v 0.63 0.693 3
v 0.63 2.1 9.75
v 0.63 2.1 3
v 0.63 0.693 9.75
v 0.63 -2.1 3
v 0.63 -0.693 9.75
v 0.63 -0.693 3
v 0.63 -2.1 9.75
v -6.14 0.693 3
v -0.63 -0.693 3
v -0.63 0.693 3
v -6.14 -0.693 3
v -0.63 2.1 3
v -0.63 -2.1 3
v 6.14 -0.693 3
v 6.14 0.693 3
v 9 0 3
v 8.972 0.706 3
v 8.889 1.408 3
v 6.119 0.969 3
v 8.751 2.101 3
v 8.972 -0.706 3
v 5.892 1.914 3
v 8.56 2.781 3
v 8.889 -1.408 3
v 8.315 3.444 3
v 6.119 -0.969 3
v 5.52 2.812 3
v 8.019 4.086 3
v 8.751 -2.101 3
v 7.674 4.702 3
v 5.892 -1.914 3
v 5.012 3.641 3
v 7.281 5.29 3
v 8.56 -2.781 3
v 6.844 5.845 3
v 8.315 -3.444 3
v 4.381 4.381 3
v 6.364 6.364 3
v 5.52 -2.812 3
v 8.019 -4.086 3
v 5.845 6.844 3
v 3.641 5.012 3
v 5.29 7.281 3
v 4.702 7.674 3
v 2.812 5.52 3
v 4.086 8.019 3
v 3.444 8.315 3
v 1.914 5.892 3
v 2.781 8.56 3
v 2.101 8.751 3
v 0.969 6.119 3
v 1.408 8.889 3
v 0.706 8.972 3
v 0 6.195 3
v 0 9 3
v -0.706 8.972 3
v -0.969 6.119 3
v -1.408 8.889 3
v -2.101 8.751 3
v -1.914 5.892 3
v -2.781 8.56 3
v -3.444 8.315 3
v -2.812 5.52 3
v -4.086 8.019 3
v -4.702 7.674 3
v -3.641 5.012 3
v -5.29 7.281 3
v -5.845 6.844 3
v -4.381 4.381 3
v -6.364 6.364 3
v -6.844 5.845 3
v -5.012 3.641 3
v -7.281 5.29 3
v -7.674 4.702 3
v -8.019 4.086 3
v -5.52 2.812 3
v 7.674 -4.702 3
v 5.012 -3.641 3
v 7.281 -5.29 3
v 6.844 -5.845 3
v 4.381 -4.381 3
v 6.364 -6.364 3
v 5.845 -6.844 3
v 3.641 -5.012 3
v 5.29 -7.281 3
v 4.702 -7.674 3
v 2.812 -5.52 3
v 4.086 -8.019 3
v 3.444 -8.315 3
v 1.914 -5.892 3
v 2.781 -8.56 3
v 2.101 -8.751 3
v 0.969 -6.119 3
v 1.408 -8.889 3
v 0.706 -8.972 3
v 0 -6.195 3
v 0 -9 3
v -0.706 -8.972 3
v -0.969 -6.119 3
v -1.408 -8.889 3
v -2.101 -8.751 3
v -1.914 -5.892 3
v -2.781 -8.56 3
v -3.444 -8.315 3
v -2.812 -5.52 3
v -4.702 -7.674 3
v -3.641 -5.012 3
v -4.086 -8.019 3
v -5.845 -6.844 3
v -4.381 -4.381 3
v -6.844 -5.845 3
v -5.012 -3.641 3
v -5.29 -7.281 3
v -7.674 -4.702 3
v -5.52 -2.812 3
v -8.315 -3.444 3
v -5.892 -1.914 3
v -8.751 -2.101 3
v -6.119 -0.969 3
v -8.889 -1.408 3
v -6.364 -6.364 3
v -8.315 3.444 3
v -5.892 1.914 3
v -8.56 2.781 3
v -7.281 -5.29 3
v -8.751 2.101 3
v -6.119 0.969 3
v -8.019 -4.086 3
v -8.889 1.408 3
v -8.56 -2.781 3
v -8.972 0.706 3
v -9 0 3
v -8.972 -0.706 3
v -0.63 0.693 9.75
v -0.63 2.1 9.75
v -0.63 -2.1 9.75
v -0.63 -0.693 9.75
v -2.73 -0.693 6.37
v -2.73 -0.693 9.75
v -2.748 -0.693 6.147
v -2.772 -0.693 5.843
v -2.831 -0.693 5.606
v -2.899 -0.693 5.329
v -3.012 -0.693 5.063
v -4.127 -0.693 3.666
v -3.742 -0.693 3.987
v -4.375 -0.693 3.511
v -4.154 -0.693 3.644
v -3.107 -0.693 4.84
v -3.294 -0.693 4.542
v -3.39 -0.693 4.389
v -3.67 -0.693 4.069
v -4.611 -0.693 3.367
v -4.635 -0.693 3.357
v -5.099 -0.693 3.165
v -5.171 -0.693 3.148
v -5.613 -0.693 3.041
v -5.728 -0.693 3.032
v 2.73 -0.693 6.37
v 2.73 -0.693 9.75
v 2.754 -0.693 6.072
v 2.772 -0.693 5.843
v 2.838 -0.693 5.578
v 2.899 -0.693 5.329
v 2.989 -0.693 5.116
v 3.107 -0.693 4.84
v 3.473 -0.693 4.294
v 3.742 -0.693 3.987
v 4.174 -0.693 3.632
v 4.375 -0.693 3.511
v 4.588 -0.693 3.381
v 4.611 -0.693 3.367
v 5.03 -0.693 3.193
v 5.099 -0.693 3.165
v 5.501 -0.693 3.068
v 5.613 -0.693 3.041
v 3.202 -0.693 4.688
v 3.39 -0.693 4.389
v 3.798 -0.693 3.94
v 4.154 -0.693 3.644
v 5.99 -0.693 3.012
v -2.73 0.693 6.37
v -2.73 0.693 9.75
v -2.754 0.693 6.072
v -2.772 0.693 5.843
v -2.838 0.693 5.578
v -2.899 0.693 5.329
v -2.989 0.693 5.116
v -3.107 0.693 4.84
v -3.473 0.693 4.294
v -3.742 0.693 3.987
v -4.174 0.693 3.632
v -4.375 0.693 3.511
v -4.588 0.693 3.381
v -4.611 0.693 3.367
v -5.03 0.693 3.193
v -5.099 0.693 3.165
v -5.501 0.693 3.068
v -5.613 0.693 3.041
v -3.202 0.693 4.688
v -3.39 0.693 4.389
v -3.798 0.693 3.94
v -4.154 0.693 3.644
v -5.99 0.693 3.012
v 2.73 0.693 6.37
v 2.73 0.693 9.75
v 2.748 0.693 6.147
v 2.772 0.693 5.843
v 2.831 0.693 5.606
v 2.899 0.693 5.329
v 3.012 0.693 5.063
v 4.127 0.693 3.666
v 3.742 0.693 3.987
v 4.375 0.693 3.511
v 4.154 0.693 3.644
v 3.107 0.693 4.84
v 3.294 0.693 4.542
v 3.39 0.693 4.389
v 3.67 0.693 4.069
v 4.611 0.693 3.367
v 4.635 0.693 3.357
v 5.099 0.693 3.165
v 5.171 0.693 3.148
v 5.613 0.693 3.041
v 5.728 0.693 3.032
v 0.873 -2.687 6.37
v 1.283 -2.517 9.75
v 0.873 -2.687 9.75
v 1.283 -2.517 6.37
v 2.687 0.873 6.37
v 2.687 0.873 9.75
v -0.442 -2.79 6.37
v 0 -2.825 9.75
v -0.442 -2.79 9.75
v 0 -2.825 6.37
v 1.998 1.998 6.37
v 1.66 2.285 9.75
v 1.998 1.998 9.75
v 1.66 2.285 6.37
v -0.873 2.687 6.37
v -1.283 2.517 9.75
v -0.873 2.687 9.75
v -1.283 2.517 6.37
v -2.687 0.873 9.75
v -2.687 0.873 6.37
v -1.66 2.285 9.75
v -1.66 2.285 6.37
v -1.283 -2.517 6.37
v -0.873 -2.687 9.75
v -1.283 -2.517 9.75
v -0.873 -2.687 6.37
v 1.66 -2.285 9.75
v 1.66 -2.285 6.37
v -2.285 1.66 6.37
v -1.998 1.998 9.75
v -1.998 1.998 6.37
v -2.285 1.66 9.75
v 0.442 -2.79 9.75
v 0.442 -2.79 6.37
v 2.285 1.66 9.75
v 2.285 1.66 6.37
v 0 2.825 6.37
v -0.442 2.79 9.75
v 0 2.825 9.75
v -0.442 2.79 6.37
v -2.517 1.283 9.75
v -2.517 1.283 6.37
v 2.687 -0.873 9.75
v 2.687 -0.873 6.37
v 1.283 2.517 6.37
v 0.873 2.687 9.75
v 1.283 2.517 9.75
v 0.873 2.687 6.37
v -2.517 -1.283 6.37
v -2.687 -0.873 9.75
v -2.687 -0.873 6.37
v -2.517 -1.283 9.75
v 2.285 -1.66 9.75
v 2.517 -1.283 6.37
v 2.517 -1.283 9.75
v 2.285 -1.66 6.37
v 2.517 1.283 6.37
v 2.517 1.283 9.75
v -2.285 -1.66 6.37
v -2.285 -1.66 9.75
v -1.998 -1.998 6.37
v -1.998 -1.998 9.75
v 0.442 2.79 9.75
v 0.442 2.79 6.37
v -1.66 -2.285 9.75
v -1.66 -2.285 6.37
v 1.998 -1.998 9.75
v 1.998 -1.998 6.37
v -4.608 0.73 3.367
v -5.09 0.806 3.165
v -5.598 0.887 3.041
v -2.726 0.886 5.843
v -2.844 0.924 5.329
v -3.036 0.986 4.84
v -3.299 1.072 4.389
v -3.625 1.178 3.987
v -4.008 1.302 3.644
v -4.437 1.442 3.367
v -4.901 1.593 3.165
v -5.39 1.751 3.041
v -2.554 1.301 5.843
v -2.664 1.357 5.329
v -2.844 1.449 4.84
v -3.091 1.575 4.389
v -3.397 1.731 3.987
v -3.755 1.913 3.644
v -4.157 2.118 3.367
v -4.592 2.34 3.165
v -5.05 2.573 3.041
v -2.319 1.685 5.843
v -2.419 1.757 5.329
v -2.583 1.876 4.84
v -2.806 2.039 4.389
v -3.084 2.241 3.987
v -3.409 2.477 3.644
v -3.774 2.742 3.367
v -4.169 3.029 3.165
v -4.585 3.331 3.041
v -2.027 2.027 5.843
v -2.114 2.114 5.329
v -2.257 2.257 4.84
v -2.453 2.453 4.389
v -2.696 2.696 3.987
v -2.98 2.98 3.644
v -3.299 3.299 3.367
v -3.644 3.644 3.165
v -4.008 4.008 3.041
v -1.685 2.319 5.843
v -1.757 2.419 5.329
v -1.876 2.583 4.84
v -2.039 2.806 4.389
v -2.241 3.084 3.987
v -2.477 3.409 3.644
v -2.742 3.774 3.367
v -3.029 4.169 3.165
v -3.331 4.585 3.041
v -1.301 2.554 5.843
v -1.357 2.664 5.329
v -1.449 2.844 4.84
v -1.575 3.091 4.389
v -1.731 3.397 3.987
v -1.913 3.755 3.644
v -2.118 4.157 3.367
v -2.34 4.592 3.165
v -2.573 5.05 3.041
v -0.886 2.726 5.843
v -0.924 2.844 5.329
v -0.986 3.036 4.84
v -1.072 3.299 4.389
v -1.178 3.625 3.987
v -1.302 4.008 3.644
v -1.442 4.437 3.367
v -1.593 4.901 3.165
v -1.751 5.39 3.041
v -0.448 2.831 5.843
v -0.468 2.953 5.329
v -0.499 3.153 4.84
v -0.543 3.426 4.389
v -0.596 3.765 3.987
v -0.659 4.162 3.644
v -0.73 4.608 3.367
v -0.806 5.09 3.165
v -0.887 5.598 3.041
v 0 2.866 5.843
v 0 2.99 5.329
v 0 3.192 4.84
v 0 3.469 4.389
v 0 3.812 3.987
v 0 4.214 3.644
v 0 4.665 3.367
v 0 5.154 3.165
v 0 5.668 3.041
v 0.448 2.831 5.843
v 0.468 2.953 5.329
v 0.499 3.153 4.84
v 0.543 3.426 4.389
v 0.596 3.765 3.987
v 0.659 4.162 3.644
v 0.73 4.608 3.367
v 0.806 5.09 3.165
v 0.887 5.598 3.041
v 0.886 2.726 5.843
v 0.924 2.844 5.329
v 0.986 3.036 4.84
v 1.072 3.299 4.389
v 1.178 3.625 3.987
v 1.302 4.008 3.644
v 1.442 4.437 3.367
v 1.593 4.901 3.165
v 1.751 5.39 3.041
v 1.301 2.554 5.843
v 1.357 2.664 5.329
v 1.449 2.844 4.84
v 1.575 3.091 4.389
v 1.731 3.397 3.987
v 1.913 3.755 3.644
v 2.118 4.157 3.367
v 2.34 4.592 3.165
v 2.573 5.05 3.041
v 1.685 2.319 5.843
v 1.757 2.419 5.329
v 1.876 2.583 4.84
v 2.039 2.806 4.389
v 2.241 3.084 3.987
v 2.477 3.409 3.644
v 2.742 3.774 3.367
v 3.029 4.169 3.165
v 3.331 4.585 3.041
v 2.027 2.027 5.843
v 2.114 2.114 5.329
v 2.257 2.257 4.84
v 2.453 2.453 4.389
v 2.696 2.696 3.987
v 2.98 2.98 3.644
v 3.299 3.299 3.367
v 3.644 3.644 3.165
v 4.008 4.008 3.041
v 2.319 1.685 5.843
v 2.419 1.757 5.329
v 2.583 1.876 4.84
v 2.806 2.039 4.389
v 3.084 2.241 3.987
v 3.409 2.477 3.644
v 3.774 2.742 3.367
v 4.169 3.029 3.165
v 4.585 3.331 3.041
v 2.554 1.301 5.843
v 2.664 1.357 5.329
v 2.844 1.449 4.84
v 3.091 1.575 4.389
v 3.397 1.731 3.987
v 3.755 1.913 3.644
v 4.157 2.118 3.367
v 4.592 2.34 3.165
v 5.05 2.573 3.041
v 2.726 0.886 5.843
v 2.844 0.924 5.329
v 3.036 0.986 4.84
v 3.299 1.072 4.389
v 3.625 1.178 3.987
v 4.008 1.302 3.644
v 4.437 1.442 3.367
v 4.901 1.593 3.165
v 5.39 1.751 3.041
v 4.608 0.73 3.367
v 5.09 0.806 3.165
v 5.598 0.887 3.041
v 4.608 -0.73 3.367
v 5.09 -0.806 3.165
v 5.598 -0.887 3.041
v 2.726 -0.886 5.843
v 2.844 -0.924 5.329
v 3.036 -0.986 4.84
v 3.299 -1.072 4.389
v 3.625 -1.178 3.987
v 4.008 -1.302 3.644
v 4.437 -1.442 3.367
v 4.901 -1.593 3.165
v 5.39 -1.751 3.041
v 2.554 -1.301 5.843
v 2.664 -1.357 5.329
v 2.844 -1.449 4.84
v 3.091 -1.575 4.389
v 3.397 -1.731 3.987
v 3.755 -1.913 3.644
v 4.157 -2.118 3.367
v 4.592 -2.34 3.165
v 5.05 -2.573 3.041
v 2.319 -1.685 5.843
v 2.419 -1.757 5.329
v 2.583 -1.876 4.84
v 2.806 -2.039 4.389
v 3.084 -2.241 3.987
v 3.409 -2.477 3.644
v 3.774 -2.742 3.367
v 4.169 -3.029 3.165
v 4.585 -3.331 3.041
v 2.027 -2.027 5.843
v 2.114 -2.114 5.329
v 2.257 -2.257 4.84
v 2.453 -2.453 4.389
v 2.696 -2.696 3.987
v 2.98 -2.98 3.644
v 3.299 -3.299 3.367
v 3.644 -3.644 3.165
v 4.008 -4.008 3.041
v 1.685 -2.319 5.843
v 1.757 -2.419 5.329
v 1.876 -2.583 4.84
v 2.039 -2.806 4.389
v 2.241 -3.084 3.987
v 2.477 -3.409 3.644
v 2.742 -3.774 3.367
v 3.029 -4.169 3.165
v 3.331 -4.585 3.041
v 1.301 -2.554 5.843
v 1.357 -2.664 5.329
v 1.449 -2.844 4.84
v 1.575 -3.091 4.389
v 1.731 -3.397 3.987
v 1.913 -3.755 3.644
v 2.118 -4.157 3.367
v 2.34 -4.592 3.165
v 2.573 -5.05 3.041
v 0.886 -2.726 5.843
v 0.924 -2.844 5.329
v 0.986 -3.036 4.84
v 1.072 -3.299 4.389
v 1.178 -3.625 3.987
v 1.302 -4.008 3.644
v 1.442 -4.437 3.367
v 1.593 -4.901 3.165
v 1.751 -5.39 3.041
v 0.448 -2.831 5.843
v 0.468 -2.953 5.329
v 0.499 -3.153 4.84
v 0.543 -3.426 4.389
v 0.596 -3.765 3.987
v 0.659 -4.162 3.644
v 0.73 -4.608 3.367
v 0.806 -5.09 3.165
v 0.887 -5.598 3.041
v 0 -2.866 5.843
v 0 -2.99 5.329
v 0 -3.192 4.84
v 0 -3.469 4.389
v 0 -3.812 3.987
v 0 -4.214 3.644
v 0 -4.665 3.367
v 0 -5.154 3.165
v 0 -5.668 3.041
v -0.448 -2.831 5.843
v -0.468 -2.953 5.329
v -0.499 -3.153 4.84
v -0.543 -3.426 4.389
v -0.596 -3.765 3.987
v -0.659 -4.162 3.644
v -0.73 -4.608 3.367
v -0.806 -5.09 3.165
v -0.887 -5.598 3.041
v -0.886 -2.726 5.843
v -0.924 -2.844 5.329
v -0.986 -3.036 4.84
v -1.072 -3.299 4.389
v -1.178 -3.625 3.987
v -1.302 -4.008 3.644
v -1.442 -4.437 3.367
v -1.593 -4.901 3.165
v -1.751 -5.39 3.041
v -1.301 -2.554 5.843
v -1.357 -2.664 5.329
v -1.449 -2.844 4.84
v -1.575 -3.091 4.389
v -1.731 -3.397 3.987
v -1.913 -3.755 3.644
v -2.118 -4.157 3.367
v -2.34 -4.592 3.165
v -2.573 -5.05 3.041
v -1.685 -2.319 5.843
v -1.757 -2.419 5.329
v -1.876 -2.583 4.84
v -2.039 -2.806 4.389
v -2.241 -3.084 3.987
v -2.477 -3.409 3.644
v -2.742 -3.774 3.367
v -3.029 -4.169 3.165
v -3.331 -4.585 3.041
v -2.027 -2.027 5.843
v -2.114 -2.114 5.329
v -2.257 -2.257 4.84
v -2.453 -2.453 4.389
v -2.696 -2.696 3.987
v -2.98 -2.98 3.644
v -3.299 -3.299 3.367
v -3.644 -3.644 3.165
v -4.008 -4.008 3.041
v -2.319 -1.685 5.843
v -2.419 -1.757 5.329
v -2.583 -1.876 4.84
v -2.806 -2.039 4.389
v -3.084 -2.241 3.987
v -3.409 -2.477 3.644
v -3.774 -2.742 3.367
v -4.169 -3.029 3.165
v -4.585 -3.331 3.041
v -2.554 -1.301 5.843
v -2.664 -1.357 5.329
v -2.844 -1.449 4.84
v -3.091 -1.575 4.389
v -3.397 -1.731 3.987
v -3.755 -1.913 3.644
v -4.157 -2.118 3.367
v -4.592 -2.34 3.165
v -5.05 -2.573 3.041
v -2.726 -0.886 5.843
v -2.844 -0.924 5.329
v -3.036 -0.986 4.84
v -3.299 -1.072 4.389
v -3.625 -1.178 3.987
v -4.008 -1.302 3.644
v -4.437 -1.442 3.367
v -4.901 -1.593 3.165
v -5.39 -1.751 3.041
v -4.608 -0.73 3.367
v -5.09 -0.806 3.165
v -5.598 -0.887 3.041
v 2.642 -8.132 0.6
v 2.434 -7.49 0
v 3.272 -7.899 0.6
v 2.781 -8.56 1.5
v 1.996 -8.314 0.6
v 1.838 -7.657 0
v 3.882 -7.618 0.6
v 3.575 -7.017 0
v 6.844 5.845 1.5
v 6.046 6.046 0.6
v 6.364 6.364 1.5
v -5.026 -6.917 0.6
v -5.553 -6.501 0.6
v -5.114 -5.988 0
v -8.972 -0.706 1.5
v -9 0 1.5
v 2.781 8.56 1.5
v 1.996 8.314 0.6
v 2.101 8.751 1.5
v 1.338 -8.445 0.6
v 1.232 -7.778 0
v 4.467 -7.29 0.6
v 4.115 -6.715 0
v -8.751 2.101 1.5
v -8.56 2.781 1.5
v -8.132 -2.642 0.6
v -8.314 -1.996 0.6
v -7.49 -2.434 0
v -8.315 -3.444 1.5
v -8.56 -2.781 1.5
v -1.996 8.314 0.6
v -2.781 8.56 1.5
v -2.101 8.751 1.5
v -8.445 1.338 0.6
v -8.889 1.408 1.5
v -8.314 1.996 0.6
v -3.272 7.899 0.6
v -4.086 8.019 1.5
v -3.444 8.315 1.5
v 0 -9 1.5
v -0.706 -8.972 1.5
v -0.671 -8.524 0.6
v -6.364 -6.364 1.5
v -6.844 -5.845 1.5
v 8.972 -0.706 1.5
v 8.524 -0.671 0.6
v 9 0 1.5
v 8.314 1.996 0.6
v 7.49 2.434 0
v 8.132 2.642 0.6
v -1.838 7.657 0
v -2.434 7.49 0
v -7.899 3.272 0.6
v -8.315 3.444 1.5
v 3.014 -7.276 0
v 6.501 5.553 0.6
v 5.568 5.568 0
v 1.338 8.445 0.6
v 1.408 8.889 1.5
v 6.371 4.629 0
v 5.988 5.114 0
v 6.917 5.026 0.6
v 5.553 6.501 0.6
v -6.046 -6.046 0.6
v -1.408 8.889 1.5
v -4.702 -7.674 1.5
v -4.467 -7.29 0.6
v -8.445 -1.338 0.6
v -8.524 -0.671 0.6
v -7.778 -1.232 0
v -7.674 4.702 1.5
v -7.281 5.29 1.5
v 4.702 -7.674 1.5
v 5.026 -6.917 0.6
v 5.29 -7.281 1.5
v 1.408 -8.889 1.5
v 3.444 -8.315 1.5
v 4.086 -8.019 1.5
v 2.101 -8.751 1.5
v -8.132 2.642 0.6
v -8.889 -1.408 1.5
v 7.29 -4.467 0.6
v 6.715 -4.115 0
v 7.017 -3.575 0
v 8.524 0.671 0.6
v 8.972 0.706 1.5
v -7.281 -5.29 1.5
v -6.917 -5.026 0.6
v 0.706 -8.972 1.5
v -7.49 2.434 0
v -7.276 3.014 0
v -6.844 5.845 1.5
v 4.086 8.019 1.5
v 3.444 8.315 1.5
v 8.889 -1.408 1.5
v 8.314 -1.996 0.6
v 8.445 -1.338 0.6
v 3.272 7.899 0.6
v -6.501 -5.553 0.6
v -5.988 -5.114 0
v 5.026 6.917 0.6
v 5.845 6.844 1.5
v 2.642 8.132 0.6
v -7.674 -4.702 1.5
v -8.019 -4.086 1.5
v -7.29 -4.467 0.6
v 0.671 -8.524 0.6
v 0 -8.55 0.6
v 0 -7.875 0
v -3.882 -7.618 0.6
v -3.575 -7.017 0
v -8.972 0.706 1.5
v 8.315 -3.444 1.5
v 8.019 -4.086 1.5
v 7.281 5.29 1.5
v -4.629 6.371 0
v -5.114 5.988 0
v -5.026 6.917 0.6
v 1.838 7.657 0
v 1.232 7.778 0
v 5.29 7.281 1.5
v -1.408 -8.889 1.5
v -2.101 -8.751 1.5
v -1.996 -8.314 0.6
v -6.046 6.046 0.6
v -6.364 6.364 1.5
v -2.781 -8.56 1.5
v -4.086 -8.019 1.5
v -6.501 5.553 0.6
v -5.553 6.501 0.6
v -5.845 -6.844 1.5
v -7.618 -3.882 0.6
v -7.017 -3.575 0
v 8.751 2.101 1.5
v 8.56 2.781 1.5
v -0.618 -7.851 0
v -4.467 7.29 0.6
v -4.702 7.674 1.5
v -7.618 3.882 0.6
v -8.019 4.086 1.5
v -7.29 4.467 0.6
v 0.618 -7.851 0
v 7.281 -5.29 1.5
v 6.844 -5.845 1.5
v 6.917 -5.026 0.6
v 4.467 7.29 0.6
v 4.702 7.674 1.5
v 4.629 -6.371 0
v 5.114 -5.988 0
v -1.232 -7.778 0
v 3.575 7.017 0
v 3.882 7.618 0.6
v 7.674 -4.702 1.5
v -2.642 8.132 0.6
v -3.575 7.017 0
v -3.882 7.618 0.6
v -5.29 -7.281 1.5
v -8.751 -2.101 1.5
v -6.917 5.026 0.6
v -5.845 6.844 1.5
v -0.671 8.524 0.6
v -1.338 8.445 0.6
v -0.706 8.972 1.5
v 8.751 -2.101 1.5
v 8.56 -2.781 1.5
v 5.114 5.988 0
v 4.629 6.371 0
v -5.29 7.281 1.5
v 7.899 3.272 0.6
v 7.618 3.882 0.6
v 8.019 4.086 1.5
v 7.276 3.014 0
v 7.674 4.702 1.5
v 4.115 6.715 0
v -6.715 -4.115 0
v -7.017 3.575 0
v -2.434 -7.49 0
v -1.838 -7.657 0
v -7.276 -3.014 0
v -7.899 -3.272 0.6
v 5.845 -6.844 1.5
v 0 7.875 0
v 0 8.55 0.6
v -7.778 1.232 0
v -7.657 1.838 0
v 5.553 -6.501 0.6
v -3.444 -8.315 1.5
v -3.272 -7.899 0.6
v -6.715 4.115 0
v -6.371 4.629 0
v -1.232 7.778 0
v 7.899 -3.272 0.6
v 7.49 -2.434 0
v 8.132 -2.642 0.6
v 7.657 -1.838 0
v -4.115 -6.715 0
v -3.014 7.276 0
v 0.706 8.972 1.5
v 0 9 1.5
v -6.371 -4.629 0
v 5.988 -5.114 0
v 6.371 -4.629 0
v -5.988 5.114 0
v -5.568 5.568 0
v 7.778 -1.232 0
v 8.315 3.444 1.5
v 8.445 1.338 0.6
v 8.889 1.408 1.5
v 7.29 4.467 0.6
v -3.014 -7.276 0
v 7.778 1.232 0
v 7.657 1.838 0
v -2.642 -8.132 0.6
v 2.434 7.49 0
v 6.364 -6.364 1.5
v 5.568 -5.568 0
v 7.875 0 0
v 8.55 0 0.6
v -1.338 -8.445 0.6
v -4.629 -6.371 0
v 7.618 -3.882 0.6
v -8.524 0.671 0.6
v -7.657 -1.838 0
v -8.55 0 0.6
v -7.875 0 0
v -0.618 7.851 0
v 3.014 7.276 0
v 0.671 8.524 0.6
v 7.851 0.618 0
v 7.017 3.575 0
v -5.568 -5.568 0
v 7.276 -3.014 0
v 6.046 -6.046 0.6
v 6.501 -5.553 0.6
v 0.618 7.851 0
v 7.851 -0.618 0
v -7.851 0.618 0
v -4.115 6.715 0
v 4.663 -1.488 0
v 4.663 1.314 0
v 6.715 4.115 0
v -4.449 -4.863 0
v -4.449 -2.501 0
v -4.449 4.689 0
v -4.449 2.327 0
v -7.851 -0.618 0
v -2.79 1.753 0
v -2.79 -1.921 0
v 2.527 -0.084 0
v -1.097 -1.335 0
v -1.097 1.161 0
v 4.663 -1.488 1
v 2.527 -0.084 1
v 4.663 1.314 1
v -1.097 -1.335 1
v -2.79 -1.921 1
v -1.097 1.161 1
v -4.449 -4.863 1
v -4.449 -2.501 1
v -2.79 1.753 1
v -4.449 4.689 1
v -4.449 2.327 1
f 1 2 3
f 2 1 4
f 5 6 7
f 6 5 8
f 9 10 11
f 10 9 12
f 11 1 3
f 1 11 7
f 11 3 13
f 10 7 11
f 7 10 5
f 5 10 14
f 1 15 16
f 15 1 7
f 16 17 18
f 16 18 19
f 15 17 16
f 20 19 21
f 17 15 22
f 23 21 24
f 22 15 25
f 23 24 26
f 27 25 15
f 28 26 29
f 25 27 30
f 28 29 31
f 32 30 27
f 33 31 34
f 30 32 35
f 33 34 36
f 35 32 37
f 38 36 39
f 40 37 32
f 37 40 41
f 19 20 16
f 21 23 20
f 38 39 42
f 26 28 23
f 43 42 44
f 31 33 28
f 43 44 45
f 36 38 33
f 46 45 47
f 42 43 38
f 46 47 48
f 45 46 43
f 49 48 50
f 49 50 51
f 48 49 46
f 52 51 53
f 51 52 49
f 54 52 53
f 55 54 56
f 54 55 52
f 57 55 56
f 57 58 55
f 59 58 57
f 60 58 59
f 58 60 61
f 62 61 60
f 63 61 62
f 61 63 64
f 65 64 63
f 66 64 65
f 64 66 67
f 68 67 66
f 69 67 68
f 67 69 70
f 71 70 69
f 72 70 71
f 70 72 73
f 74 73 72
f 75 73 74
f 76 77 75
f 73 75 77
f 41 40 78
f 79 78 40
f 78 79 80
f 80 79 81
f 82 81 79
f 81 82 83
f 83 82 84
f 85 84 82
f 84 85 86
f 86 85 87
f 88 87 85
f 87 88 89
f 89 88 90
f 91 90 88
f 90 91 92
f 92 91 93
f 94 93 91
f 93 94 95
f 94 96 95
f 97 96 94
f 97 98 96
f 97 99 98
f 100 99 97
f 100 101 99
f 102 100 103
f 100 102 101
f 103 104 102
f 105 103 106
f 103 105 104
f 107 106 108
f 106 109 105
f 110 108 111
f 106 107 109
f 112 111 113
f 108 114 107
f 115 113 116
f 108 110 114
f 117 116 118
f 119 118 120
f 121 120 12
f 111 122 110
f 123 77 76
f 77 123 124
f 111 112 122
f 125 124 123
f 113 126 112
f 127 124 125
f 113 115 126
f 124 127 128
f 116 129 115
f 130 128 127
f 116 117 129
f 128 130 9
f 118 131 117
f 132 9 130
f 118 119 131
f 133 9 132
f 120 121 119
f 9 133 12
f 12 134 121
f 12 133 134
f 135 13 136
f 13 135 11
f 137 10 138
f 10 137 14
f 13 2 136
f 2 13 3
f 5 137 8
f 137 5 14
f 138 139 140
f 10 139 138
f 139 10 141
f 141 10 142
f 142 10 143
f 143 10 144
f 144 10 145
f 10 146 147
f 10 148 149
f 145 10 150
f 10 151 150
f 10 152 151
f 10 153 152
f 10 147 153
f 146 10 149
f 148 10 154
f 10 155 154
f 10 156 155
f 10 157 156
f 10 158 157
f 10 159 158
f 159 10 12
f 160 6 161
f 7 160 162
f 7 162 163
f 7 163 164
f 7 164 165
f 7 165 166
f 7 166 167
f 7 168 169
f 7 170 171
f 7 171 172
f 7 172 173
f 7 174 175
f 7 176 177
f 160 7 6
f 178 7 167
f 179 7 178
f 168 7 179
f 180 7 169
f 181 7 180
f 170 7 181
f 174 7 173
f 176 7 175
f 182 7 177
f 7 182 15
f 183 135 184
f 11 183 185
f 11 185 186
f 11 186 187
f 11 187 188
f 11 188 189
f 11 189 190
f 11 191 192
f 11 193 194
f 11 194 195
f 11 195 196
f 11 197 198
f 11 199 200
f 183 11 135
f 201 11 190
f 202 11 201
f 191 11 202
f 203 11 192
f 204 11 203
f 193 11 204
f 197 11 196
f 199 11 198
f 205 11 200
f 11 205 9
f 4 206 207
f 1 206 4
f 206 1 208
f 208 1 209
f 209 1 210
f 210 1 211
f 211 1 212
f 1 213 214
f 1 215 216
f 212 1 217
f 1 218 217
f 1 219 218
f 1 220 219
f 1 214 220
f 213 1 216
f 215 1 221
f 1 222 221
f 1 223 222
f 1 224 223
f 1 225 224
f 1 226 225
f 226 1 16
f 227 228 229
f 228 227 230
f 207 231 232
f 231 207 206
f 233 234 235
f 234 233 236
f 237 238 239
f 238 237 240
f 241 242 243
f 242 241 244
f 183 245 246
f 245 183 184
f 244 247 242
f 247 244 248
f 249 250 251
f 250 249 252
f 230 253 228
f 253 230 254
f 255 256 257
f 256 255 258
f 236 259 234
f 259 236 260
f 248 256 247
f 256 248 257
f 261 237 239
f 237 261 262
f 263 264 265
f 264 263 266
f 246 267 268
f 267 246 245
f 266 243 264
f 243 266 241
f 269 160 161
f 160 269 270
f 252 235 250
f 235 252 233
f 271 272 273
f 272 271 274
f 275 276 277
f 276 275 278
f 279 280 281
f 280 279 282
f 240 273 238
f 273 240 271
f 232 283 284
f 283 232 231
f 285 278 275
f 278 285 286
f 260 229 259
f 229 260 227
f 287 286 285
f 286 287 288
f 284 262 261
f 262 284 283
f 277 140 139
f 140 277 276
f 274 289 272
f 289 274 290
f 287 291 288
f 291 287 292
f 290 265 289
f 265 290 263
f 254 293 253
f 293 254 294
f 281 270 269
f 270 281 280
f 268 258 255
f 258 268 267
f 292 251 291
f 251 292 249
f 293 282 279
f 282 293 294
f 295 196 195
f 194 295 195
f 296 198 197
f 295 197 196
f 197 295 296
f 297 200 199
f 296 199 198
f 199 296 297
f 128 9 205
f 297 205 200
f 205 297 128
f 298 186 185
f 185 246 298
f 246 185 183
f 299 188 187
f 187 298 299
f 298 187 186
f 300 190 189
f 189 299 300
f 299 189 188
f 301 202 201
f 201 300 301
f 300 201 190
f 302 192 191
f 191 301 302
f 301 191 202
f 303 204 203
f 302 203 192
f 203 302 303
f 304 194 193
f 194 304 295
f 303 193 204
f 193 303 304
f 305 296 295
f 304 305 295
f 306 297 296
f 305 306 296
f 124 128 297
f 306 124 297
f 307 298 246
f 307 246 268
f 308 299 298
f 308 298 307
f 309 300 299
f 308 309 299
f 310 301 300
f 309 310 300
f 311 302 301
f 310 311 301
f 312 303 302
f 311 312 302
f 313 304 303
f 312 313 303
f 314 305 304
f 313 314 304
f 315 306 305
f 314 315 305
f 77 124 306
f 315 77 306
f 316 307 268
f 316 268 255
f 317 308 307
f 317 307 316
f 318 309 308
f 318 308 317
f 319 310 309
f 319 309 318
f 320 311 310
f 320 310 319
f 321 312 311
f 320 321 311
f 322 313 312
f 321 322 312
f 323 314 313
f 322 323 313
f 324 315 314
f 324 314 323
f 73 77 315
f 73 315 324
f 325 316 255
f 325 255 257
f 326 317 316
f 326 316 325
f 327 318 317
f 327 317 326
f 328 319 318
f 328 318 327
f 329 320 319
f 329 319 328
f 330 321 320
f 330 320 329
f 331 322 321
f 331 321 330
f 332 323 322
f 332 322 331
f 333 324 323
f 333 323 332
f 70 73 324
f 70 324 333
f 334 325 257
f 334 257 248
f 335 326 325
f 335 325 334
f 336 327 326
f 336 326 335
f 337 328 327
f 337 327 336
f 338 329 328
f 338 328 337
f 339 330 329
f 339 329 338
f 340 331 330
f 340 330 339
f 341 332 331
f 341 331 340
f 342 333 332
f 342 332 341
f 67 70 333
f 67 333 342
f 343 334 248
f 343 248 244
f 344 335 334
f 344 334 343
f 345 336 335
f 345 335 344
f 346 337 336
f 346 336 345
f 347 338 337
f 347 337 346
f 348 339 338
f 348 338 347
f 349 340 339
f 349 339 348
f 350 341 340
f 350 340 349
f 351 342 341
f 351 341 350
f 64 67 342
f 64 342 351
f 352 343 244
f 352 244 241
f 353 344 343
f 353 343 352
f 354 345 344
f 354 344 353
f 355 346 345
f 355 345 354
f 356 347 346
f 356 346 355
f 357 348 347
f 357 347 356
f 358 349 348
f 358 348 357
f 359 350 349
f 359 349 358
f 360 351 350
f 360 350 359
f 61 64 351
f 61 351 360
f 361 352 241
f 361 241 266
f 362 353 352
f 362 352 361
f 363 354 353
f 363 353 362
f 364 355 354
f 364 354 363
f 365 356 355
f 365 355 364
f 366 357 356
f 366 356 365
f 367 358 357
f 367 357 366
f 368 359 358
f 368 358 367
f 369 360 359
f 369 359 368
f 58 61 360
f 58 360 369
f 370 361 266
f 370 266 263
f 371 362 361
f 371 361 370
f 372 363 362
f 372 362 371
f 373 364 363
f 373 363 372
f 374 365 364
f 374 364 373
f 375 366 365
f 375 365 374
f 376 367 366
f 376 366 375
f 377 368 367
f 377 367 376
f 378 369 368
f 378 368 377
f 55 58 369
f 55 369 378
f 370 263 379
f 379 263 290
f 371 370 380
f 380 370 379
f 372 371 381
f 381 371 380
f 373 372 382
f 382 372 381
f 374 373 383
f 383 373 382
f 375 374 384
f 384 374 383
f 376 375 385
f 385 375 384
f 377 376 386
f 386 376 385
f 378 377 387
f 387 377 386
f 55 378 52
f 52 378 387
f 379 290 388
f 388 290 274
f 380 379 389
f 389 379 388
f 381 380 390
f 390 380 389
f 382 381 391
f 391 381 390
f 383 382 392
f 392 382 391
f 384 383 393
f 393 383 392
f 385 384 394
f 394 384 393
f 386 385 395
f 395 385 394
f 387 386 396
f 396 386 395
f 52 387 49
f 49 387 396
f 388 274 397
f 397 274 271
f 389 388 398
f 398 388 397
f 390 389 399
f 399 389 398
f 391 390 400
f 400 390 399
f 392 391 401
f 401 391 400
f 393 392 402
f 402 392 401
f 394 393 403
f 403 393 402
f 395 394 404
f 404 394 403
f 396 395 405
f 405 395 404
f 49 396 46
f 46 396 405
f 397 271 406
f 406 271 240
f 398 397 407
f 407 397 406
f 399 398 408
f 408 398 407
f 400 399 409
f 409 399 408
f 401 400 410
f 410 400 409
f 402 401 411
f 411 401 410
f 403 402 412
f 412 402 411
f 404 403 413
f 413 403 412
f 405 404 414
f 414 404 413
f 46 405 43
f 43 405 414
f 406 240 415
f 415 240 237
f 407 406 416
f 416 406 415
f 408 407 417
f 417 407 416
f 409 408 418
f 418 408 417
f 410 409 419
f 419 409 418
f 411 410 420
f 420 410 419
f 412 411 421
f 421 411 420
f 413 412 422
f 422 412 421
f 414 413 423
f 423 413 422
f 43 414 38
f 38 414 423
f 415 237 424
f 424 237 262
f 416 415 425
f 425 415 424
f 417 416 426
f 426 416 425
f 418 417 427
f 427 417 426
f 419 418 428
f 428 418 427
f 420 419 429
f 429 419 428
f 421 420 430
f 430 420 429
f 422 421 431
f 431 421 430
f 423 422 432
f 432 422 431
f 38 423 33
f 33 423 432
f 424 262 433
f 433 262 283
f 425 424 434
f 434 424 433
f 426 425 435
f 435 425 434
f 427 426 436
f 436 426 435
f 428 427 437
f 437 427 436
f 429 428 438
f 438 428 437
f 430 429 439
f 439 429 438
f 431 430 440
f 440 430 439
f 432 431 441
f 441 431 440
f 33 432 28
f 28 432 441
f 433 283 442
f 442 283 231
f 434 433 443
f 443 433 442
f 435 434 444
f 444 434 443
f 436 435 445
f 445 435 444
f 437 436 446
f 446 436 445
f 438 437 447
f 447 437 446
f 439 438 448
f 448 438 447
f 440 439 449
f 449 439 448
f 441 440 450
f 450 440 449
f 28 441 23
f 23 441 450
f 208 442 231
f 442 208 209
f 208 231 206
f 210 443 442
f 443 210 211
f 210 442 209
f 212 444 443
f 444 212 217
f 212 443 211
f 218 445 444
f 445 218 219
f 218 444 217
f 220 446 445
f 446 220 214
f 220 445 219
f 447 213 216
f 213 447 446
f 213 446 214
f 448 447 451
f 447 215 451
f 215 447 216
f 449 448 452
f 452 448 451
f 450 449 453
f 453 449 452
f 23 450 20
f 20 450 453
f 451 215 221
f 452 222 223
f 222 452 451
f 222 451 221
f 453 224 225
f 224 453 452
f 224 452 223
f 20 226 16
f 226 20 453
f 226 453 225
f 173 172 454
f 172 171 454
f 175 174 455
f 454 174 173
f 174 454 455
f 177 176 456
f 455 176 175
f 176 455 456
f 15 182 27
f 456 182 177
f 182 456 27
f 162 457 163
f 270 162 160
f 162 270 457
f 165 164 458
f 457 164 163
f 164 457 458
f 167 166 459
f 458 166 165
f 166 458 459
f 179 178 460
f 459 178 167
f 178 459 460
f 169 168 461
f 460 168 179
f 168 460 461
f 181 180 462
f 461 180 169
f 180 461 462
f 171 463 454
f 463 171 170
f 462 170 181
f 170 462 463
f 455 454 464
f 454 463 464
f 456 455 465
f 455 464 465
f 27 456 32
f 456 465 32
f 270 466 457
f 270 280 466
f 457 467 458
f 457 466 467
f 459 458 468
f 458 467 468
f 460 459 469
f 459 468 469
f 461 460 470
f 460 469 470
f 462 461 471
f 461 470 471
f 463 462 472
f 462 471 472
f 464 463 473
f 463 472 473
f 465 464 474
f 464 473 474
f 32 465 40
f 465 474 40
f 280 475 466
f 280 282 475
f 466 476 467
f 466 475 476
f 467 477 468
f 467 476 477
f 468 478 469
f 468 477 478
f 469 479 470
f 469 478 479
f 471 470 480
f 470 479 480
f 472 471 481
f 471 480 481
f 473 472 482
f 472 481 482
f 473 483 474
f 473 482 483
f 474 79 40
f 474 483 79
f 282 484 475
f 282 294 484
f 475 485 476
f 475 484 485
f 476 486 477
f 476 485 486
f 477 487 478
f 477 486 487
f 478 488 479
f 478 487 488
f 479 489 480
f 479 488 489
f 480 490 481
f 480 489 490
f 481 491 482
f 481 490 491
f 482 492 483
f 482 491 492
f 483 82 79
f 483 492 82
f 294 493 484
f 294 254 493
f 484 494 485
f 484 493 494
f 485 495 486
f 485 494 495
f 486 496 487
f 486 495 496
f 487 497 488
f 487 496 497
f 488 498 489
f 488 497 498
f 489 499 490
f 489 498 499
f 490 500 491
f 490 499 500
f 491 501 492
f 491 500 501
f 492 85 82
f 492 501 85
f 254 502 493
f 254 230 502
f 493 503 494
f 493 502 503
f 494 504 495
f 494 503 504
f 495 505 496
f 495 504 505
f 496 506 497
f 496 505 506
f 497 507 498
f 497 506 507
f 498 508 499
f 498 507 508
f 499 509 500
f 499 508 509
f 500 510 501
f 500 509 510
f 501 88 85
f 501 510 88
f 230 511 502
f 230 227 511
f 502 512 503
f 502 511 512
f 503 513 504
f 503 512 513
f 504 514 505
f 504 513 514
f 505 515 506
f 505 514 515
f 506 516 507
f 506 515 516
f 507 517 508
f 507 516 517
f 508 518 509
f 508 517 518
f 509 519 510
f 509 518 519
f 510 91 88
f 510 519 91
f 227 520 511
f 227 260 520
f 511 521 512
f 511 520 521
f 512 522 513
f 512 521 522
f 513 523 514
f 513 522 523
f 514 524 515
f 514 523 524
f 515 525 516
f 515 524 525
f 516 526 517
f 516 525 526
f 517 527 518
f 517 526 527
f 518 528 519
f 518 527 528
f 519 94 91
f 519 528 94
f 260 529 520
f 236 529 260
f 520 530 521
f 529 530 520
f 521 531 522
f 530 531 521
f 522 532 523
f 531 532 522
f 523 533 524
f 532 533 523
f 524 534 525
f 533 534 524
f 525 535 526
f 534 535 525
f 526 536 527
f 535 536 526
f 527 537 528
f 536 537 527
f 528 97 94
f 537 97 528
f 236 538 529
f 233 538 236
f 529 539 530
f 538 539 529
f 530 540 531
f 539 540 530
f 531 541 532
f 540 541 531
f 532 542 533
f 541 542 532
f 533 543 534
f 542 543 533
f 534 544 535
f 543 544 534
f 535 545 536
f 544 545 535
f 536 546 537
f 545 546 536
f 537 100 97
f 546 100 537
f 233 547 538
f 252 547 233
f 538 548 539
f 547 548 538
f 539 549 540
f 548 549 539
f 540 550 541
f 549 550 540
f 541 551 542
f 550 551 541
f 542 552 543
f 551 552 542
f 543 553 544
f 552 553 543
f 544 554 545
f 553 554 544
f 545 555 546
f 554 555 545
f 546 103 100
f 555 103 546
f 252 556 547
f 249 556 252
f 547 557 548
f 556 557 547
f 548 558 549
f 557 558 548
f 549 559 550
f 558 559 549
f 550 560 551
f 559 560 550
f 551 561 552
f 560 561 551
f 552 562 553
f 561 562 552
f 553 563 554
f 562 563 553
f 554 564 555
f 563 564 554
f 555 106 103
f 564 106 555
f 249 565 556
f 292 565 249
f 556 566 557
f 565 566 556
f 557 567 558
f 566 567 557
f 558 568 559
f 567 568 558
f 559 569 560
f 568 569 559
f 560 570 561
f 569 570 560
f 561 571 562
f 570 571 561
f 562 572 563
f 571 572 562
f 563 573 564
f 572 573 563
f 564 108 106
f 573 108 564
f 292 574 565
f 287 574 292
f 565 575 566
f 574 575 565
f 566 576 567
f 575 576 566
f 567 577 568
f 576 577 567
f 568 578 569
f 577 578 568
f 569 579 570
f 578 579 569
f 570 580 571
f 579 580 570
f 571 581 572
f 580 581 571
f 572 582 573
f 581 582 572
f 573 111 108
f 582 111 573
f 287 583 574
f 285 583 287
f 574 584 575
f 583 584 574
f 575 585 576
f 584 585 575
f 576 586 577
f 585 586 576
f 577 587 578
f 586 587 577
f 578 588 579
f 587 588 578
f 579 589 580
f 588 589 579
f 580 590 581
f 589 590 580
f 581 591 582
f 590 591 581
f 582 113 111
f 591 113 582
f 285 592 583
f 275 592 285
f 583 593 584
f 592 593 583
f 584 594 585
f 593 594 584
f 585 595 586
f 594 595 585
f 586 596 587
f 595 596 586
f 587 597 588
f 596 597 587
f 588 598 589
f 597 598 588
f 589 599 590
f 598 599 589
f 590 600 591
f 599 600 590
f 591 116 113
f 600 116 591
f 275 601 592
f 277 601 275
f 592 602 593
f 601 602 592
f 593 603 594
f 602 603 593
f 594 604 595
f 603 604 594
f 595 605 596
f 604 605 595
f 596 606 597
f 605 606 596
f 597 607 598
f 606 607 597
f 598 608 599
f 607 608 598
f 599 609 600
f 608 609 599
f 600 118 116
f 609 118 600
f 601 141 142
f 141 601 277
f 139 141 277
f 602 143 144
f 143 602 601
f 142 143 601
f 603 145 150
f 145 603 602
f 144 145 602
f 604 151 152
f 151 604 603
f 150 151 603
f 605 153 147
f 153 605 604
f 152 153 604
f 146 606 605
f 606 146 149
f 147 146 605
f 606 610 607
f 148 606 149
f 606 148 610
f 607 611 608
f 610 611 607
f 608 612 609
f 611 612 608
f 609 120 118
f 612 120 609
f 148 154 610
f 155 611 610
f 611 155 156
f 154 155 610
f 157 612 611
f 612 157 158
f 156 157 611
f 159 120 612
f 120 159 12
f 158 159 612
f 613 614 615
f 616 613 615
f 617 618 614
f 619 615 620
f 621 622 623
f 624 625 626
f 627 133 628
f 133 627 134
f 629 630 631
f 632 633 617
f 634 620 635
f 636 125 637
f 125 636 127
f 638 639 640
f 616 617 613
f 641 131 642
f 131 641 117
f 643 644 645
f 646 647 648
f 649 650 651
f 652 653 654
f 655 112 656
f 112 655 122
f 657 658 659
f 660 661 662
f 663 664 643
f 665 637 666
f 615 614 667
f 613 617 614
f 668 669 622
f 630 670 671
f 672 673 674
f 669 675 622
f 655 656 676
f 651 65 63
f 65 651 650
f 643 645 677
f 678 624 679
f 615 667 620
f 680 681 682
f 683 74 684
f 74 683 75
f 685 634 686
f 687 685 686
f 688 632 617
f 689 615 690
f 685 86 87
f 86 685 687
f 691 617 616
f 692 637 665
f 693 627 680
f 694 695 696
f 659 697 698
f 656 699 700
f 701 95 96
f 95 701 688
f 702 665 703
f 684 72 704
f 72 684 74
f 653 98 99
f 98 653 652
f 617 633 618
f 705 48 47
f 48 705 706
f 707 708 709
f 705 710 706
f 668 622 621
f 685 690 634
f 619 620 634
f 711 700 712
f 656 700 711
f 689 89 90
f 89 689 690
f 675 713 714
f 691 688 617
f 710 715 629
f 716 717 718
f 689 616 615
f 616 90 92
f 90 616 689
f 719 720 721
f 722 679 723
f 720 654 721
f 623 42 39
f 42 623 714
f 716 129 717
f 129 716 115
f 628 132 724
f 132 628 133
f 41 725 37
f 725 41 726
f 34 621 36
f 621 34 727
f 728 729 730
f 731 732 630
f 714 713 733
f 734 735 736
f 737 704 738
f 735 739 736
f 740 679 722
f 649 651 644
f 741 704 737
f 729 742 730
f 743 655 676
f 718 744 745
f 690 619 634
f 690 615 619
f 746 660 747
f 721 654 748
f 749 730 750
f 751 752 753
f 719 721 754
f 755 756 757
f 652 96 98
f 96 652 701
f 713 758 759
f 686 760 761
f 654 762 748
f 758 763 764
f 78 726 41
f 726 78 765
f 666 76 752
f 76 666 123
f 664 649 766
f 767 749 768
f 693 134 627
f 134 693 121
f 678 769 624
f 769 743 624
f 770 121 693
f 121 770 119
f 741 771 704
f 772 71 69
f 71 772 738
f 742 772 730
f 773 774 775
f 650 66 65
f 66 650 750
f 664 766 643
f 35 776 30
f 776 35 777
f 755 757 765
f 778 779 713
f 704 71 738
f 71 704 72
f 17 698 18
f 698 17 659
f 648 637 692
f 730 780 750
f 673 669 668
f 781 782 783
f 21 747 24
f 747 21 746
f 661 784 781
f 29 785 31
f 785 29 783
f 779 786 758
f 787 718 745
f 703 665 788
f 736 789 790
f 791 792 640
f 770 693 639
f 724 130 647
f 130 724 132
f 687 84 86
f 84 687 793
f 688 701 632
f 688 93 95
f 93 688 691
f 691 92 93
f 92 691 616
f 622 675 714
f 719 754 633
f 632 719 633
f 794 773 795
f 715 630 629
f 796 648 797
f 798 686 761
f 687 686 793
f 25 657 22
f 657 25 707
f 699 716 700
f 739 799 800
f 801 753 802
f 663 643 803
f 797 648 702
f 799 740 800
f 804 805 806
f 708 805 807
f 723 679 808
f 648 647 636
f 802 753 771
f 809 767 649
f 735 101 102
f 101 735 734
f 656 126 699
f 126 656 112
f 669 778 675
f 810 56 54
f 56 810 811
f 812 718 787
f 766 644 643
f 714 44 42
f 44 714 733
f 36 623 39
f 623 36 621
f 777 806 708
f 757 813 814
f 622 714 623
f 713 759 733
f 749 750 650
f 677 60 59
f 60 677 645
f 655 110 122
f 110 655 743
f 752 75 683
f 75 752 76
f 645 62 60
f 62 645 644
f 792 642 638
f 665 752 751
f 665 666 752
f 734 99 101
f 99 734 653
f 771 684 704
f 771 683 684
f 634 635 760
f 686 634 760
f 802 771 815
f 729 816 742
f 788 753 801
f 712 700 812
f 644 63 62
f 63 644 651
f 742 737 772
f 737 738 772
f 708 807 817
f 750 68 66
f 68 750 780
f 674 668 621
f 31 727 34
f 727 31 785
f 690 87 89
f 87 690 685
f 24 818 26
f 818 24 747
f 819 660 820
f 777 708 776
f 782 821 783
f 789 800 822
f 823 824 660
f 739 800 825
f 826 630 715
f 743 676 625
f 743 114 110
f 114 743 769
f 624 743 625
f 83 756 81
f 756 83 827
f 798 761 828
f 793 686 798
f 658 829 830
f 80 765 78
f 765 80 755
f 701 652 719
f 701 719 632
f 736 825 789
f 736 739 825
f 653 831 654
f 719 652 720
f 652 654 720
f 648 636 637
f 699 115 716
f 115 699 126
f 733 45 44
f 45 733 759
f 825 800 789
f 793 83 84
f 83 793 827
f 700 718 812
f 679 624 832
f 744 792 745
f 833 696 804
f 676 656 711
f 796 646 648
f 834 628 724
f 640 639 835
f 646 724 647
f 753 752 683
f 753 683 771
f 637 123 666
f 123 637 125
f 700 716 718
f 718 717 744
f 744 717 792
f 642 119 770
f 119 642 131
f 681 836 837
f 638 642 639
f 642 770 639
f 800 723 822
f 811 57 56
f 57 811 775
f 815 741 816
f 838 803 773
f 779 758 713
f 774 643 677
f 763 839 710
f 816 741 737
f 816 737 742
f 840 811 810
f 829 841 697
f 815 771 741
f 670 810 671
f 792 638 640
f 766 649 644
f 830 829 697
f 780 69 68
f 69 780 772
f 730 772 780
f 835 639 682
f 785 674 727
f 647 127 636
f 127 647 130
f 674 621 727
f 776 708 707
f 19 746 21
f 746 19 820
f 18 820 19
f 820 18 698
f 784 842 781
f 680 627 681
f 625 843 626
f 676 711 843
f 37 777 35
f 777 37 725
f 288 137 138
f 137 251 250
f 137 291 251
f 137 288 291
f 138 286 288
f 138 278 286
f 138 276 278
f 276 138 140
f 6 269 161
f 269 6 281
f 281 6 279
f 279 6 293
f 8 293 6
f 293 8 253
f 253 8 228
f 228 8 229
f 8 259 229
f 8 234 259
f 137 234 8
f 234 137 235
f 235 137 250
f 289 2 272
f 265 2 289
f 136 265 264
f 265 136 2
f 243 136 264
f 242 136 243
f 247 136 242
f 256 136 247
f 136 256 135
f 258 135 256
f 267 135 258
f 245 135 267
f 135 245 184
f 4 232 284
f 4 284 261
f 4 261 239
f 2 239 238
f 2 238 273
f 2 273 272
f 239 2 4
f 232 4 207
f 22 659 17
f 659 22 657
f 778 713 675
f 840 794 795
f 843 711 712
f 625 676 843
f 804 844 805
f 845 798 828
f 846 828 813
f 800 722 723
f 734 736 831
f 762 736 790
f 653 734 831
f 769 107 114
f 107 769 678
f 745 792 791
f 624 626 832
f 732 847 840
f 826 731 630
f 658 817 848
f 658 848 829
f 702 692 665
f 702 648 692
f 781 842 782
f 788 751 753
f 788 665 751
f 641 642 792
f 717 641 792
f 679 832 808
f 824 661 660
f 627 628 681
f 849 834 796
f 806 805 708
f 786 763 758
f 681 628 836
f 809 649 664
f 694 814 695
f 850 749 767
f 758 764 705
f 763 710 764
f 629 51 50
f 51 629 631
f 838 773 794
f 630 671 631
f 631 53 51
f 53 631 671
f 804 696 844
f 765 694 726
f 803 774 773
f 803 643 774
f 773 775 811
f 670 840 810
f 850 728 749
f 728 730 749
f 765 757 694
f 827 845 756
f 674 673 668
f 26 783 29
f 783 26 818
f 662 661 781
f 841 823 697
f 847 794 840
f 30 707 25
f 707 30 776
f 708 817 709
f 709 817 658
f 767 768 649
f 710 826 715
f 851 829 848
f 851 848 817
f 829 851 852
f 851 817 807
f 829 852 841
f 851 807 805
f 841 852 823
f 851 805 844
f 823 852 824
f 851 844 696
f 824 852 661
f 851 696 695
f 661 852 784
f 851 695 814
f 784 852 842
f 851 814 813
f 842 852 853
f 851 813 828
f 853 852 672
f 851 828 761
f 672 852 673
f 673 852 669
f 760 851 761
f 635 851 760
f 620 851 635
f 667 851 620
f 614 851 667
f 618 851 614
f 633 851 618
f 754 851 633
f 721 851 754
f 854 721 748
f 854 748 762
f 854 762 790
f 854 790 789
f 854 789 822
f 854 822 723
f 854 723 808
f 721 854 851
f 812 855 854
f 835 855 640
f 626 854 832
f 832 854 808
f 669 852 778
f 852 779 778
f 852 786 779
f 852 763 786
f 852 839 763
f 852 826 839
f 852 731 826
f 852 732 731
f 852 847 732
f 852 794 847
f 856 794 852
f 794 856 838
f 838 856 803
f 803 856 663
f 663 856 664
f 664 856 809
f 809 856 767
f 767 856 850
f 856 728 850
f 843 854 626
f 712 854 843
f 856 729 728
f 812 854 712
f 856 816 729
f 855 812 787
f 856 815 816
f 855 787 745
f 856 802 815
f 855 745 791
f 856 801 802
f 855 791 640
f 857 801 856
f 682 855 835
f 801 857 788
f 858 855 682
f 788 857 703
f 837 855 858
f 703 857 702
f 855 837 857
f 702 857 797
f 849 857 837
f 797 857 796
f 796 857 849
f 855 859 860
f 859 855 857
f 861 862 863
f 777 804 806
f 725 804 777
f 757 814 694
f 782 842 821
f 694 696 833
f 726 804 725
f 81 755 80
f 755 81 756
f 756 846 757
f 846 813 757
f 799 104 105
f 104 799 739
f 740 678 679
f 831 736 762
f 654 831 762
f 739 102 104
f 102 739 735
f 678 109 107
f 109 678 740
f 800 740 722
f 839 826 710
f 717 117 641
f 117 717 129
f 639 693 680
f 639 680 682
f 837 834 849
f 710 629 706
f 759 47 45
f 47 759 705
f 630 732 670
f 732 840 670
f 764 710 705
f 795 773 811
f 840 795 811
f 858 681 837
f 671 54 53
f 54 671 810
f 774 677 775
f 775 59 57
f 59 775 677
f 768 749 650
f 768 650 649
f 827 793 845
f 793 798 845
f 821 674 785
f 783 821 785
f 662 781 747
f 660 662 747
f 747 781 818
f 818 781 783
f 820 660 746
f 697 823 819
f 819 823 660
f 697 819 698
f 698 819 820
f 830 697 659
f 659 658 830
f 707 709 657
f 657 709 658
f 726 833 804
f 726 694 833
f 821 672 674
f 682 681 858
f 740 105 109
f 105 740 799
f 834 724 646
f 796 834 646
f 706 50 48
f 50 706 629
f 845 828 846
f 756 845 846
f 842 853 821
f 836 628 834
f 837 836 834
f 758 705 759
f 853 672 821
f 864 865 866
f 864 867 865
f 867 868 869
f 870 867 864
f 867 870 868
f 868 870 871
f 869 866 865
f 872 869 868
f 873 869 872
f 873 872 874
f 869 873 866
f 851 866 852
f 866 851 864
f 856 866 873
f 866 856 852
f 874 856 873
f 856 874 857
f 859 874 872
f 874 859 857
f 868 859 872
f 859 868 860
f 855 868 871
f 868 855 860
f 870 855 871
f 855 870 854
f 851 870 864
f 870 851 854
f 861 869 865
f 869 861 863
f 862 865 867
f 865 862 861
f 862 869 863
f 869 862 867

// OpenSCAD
// Base Number of Faces
$fn = 40;

// Face Diameter
face_diameter = 18; // [8:23]
face_radius = face_diameter/2;

// Face Thickness
face_thickness = 3; // [2:0.1:7]

// Total Key Height
key_height = 10.5; // [6:0.1:15]

// Text on Face
text = "A";

// Text Depth
text_depth = 1; // [0.1:0.1:5]

// Fillet Radius
curve_radius = 3.37; // [0.5:0.1:5]

// Stem Diameter
stem_diameter = 5.65; // [4.2:0.1:6]
stem_radius = stem_diameter/2;

// Cross Thickness (make small changes only)
cross_thickness = 1.26;

// Cross Width (make small changes only)
cross_width = 4.2;
cross_depth = key_height - face_thickness;


// Cutter tool for the cross
module cross_cutter() {
  translate([0, 0, face_thickness + (cross_depth/2)]) {
    cube([cross_thickness, cross_width, cross_depth], center = true);
    rotate([0, 0, 90]) {
      cube([cross_thickness * 1.1, face_diameter, cross_depth], center = true);
    }
  }
}

// Rest of the key construction
translate([0, 0, 0]) {
  difference() {
    hull() {
      face_thickness_quarter = face_thickness/4;
      cylinder(r = face_radius*0.875, h = face_thickness_quarter, $fn = $fn * 2);
      translate([0, 0, face_thickness_quarter * 0.8]) {
        cylinder(r = face_radius*0.95, h = face_thickness_quarter, $fn = $fn * 2);
      }
      translate([0, 0, face_thickness_quarter * 2]) {
        cylinder(r = face_radius, h = face_thickness_quarter, $fn = $fn * 2);
      }
      translate([0, 0, face_thickness_quarter * 3]) {
        cylinder(r = face_radius, h = key_height - face_thickness, $fn = $fn * 2);
      }
    }

    cross_cutter();

    translate([0, 0, face_thickness]) {
      union() {
        translate([0, 0, curve_radius]) {
          difference() {
            cylinder(r = stem_diameter * 2, h = key_height - face_thickness);
            cylinder(r = stem_radius, h = key_height - face_thickness);
          }
        }
        difference() {
          cylinder(r = face_radius * 2, h = key_height - face_thickness);
          cylinder(r = stem_radius + curve_radius, h = key_height - face_thickness);
        }
        rotate_extrude(convexity = 10) {
          translate([stem_radius + curve_radius, curve_radius, 0]) {
            circle(r = curve_radius);
          }
        }
      }
    }
    linear_extrude(text_depth) {
      translate([0, -0.2, 0]) {
        rotate([180, 0, 90]) {
          text(text, font = "Lato:style=Bold", halign = "center", valign = "center", size = (face_diameter * 0.5));
        }
      }
    }
  }
}
